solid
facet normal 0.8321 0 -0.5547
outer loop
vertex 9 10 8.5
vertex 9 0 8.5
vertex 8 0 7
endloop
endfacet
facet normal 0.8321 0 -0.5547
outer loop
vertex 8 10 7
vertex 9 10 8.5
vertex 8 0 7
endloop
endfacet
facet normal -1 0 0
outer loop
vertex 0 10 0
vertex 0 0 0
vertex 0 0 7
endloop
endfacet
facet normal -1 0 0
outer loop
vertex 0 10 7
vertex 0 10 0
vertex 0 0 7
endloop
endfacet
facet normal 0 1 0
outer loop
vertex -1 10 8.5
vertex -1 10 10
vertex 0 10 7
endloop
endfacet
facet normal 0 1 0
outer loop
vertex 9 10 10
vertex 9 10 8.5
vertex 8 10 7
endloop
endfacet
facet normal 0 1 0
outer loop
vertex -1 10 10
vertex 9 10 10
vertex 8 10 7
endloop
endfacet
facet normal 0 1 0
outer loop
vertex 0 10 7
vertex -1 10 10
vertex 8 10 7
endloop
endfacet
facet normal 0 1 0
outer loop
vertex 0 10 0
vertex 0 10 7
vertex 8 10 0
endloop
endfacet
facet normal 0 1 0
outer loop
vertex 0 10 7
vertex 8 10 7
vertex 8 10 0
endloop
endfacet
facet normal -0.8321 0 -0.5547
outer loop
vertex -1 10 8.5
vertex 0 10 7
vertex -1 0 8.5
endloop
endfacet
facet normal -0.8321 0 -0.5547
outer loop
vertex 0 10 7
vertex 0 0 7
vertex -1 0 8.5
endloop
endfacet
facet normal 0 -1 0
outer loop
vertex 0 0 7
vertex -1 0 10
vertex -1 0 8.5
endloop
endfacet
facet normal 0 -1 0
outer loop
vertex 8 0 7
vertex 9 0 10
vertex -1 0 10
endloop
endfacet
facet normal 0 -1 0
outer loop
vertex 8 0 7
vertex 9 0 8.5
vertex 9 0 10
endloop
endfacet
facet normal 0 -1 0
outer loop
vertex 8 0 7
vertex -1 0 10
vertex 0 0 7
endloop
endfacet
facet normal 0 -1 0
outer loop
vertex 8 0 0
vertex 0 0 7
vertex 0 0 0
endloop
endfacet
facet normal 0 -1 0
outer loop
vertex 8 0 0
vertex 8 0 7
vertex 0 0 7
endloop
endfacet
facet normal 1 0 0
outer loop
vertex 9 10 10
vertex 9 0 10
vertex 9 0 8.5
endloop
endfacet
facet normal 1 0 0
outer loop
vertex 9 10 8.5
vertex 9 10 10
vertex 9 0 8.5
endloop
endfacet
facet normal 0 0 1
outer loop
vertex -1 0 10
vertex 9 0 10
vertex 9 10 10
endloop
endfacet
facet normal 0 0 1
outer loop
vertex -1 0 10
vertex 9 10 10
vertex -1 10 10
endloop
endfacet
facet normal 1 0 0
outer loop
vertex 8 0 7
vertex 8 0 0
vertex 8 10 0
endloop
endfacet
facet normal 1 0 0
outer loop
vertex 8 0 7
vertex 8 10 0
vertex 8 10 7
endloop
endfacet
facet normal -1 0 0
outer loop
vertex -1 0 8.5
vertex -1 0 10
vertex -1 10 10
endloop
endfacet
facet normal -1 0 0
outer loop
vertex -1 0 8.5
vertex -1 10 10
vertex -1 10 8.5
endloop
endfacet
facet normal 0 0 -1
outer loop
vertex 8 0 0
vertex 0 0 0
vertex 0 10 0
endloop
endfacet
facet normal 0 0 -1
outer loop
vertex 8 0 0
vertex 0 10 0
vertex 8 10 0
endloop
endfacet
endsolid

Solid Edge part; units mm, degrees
sketch "Sketch1" plane through (0, 0, 0) normal (0, -1, 0) x (1, 0, 0)
  line L0 (9, 10) -> (-1, 10)
  line L1 (-1, 10) -> (-1, 8.5)
  line L2 (0, 7) -> (-1, 8.5)
  line L3 (0, 0) -> (0, 7)
  line L4 (0, 0) -> (8, 0)
  line L5 (8, 0) -> (8, 7)
  line L6 (9, 8.5) -> (8, 7)
  line L7 (9, 10) -> (9, 8.5)
extrude "Protrusion1" add sketch "Sketch1" against normal blind 10
properties material "Stainless Steel, 420"
